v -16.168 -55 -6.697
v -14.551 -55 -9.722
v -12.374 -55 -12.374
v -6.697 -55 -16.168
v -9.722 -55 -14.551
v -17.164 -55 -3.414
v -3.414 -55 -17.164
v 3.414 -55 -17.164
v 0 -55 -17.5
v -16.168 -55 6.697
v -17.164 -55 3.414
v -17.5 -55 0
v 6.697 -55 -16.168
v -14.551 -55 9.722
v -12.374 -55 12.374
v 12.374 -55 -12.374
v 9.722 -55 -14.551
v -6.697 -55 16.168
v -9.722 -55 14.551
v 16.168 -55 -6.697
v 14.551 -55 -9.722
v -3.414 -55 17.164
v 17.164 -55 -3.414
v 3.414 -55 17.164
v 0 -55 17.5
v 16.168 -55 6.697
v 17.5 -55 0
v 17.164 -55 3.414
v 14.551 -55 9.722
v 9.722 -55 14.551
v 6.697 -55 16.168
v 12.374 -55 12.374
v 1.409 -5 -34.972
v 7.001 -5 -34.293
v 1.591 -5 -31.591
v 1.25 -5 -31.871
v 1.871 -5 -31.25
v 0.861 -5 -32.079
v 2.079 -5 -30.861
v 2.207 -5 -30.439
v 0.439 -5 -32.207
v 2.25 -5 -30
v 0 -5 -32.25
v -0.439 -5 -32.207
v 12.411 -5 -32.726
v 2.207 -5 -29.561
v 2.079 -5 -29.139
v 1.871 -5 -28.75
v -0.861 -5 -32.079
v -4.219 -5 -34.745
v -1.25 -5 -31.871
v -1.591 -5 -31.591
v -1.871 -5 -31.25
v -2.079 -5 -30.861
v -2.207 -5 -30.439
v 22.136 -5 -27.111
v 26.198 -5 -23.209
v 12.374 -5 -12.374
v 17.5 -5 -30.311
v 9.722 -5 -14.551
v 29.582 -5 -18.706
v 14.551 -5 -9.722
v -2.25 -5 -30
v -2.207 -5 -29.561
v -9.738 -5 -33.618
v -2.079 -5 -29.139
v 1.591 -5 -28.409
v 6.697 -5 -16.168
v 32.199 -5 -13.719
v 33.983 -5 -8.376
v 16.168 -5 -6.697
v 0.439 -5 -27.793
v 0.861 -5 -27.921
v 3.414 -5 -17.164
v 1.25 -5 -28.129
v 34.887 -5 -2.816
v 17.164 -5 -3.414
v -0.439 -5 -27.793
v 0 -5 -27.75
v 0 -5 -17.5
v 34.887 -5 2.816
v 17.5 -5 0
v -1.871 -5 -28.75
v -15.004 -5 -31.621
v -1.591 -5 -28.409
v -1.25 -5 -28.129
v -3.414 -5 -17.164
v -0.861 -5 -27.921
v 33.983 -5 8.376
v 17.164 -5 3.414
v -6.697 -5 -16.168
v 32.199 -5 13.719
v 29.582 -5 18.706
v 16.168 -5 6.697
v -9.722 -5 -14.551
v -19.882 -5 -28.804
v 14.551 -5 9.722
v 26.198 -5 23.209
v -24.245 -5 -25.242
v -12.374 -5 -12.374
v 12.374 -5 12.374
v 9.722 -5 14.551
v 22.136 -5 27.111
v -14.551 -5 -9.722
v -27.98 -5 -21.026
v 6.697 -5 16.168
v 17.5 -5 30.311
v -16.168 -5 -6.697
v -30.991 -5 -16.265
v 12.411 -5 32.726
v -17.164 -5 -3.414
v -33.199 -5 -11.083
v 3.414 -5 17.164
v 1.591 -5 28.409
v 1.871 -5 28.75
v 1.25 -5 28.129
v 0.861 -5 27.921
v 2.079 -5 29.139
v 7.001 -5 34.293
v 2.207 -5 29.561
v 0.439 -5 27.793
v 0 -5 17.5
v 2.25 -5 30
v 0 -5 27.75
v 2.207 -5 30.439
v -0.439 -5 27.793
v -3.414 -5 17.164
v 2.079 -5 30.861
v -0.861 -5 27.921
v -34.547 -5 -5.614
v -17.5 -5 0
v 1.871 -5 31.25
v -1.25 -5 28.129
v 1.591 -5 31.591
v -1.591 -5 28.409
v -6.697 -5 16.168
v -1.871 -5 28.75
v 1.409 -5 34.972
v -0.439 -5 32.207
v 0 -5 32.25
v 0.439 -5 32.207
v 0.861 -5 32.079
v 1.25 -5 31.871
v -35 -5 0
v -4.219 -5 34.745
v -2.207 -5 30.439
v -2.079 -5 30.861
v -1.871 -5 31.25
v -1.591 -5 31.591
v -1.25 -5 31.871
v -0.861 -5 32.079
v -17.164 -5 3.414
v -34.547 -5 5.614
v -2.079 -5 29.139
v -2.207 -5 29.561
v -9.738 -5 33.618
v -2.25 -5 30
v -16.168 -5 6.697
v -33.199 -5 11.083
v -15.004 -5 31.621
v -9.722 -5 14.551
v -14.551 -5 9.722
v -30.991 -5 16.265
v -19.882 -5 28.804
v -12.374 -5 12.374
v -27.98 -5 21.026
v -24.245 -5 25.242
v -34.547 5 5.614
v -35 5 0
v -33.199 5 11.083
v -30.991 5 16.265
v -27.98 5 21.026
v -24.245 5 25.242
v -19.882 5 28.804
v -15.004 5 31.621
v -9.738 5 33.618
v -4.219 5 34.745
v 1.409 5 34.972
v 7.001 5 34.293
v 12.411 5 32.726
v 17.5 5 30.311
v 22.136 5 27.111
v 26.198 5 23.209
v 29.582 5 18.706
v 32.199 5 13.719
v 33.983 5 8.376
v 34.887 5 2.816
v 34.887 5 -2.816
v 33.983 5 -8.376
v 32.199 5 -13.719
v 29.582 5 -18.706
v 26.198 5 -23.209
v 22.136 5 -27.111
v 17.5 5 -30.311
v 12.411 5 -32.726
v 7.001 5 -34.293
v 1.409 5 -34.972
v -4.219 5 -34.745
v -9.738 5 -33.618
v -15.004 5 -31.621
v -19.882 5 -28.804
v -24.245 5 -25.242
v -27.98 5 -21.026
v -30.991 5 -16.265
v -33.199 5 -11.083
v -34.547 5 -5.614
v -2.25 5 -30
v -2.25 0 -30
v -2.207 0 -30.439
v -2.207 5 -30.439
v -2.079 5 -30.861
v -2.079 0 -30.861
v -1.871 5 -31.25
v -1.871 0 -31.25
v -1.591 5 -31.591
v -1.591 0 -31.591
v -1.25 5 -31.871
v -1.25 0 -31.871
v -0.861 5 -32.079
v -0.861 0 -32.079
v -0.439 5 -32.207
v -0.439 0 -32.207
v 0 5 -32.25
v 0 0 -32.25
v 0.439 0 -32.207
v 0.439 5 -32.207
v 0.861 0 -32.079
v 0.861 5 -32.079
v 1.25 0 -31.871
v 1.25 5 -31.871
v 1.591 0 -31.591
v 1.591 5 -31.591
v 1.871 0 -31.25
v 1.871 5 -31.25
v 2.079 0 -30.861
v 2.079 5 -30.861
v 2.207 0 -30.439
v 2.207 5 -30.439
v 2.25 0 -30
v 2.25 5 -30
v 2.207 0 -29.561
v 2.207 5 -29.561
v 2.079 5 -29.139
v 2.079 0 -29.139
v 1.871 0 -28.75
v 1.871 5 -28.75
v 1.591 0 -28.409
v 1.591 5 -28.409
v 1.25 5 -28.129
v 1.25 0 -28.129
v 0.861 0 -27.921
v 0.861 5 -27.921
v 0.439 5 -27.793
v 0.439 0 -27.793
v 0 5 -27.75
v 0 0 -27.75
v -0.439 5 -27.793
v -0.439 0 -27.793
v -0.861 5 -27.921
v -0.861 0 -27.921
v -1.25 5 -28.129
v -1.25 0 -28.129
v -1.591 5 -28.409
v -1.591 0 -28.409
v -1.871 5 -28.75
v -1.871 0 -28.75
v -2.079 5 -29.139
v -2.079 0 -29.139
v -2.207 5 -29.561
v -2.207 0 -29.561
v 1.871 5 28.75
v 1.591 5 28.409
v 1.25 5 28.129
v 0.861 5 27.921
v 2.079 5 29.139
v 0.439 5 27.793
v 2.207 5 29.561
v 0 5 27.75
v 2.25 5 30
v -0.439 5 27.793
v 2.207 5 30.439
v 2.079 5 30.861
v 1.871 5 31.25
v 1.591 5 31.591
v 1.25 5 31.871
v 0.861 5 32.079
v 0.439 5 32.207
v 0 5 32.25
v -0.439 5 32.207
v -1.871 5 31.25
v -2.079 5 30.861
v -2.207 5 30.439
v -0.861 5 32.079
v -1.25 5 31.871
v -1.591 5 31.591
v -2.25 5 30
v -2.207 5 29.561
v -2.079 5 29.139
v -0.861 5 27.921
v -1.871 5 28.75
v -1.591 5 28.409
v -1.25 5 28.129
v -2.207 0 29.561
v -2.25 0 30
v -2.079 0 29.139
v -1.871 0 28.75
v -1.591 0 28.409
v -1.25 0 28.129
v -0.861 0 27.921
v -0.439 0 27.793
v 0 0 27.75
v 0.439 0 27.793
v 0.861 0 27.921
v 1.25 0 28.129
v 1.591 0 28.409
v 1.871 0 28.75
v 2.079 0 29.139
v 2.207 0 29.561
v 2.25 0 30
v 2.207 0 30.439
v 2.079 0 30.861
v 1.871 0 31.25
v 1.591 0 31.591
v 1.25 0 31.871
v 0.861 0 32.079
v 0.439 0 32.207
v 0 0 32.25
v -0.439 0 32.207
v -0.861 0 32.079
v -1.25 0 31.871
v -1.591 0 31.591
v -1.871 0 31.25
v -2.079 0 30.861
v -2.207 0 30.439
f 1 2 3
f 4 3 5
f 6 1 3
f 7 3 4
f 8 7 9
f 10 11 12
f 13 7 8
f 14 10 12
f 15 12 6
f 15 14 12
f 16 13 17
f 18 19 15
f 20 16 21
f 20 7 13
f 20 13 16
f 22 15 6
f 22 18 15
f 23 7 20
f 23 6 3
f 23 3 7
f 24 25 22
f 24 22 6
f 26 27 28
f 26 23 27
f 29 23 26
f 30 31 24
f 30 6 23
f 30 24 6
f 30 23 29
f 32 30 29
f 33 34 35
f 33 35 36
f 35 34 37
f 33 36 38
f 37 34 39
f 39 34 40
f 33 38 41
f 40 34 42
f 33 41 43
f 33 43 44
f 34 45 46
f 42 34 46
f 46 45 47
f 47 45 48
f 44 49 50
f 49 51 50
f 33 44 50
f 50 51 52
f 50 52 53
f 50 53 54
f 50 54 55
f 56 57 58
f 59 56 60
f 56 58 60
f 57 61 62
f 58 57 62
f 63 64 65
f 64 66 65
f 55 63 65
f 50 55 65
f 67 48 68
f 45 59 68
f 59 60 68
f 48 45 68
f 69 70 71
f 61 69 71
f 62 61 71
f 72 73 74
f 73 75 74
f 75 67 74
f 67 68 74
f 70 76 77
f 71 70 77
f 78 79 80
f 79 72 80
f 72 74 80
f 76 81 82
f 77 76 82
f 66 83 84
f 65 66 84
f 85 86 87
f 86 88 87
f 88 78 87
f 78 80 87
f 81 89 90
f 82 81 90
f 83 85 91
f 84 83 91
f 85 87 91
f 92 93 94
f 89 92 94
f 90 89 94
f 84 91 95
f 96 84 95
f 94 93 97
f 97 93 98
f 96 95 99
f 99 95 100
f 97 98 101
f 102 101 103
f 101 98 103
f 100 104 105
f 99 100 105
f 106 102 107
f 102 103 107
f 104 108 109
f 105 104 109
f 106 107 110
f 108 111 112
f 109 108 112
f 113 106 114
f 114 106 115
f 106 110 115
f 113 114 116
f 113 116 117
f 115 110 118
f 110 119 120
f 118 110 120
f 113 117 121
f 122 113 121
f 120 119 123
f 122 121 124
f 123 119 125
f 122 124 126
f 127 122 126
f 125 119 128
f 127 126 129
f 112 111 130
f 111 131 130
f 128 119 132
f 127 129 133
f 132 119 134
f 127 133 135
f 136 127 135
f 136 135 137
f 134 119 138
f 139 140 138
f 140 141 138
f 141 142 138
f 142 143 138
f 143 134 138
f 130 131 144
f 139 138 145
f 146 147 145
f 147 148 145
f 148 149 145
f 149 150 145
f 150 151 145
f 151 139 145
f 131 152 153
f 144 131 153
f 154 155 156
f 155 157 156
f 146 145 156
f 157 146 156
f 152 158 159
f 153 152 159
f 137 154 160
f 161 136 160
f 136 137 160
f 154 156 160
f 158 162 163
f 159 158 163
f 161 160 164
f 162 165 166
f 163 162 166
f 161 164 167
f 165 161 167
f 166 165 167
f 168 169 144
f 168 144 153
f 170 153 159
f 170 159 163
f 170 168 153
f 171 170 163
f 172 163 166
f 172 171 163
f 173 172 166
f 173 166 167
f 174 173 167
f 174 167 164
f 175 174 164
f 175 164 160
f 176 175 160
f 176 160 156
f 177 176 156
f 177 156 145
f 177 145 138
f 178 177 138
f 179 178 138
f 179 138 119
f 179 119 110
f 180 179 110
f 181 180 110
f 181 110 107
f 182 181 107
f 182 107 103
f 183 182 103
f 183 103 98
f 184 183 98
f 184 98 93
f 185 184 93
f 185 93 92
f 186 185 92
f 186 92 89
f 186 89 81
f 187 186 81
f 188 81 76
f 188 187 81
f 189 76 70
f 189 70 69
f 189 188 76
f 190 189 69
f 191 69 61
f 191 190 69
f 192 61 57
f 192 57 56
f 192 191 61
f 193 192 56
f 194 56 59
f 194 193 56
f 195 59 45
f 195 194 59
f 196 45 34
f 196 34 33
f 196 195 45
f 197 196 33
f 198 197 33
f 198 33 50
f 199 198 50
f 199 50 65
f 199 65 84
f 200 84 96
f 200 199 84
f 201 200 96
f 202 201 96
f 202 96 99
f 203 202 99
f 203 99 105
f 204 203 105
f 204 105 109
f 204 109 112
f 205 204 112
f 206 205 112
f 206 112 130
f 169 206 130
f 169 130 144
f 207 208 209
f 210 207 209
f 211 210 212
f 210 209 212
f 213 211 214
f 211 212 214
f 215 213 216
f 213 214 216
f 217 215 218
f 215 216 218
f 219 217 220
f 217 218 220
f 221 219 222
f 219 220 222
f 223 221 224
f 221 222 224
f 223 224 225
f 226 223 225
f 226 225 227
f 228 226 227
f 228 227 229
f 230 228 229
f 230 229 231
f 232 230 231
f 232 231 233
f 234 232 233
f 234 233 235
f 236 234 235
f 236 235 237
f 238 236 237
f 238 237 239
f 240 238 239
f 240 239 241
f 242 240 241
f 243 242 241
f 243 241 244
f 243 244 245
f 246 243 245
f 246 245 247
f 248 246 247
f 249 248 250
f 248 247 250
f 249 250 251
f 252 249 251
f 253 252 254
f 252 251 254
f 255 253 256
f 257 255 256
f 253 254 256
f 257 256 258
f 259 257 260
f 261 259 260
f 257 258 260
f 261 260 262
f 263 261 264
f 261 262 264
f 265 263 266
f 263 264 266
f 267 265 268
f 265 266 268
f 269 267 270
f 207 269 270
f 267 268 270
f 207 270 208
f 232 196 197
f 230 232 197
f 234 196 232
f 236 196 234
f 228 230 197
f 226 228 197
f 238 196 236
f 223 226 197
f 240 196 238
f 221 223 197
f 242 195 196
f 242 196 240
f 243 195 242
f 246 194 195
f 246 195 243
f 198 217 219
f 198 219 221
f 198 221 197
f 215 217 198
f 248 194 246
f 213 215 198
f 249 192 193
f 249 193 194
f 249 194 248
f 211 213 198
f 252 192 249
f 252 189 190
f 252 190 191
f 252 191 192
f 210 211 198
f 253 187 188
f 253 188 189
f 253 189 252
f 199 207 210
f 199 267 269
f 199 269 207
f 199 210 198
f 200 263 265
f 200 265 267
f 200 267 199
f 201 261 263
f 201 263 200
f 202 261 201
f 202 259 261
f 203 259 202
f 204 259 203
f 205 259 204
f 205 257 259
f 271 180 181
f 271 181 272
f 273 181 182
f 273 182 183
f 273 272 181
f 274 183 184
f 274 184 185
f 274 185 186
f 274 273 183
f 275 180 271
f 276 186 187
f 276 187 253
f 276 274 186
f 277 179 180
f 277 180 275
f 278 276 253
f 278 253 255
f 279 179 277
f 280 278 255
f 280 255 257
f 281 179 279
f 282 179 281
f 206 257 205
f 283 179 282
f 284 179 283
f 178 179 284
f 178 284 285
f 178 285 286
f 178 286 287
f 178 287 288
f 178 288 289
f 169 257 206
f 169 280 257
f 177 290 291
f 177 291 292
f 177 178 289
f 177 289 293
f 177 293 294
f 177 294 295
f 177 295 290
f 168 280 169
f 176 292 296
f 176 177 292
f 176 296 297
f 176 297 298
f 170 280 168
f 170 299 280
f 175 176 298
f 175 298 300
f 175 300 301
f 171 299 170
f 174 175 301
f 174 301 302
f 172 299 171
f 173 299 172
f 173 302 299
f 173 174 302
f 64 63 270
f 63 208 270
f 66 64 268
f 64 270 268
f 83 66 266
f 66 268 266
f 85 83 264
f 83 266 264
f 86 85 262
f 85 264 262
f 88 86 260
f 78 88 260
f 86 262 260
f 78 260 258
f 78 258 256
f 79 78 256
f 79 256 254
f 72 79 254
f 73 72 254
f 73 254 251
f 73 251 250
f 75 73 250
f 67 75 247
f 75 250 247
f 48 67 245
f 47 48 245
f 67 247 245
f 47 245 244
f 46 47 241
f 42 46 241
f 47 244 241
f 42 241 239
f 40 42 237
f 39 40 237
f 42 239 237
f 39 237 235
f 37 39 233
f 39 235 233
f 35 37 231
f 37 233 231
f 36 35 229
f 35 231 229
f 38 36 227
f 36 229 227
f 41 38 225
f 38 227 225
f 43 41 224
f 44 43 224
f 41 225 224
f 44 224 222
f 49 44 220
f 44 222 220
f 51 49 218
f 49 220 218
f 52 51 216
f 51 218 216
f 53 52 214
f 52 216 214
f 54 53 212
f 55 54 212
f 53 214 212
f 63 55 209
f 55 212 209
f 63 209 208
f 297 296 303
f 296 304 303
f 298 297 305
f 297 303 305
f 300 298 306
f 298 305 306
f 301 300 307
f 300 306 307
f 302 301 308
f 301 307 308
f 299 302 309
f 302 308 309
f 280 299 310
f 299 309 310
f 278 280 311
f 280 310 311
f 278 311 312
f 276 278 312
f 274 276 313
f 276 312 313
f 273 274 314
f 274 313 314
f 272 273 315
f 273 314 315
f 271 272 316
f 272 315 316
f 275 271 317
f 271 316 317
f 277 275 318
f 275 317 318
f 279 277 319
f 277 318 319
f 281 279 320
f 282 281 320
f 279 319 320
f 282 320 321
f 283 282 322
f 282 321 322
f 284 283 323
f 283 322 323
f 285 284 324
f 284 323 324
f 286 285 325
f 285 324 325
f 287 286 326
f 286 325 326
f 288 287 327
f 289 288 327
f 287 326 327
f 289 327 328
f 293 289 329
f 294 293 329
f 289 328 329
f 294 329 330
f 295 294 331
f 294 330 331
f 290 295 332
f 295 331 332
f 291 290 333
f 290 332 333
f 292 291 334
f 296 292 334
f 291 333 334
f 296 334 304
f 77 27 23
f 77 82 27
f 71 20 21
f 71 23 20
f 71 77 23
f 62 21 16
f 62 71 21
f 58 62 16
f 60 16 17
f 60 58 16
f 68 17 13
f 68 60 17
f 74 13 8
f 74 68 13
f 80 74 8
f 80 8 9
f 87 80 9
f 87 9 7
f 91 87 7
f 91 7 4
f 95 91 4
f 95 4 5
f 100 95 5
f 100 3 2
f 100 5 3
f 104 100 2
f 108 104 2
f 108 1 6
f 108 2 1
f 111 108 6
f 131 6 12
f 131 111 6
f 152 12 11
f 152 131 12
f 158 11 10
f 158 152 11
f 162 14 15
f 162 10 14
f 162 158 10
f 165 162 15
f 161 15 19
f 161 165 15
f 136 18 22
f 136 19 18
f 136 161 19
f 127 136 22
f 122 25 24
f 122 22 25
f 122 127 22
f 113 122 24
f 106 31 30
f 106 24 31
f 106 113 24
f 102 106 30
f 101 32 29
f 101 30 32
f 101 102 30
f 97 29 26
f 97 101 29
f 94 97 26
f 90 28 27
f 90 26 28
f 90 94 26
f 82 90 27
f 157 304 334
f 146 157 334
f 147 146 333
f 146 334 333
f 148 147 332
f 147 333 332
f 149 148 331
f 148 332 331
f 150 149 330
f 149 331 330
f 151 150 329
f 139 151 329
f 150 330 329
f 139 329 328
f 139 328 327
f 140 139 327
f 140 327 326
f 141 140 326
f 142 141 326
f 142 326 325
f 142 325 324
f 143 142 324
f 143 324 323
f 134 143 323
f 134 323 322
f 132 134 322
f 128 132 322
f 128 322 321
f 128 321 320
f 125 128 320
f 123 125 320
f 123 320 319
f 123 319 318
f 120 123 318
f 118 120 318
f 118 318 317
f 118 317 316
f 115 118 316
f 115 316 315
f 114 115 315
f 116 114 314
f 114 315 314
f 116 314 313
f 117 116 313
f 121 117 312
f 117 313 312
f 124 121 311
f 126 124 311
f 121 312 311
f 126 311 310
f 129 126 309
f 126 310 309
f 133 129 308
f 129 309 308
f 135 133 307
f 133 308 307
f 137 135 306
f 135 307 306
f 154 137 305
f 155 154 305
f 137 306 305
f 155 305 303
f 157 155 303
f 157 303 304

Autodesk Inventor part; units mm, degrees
ref_plane "YZ Plane" through (0, 0, 0) normal (1, 0, 0) x (0, 1, 0)
ref_plane "XZ Plane" through (0, 0, 0) normal (0, 1, 0) x (-1, 0, 0)
ref_plane "XY Plane" through (0, 0, 0) normal (0, 0, 1) x (1, 0, 0)
sketch "Sketch1" plane through (0, 0, 0) normal (0, 1, 0) x (-1, 0, 0)
  circle A0 centre (0, 0) radius 35
  circle A1 centre (0, 0) radius 30
  circle A2 centre (0, -30) radius 2.25
  circle A3 centre (0, 30) radius 2.25
  dimension "d0" = 70
  dimension "d1" = 60
  dimension "d2" = 4.5
  dimension "d3" = 4.5
extrude "Extrusion1" add sketch "Sketch1" along normal mid plane 10 contours A0 | A1 A2 A3
sketch "Sketch2" plane through (0, -5, 0) normal (0, -1, 0) x (1, 0, 0)
  circle A0 centre (0, 0) radius 17.5
  dimension "d6" = 35
extrude "Extrusion2" add sketch "Sketch2" along normal blind 50
properties part number "Adapter Plate"
